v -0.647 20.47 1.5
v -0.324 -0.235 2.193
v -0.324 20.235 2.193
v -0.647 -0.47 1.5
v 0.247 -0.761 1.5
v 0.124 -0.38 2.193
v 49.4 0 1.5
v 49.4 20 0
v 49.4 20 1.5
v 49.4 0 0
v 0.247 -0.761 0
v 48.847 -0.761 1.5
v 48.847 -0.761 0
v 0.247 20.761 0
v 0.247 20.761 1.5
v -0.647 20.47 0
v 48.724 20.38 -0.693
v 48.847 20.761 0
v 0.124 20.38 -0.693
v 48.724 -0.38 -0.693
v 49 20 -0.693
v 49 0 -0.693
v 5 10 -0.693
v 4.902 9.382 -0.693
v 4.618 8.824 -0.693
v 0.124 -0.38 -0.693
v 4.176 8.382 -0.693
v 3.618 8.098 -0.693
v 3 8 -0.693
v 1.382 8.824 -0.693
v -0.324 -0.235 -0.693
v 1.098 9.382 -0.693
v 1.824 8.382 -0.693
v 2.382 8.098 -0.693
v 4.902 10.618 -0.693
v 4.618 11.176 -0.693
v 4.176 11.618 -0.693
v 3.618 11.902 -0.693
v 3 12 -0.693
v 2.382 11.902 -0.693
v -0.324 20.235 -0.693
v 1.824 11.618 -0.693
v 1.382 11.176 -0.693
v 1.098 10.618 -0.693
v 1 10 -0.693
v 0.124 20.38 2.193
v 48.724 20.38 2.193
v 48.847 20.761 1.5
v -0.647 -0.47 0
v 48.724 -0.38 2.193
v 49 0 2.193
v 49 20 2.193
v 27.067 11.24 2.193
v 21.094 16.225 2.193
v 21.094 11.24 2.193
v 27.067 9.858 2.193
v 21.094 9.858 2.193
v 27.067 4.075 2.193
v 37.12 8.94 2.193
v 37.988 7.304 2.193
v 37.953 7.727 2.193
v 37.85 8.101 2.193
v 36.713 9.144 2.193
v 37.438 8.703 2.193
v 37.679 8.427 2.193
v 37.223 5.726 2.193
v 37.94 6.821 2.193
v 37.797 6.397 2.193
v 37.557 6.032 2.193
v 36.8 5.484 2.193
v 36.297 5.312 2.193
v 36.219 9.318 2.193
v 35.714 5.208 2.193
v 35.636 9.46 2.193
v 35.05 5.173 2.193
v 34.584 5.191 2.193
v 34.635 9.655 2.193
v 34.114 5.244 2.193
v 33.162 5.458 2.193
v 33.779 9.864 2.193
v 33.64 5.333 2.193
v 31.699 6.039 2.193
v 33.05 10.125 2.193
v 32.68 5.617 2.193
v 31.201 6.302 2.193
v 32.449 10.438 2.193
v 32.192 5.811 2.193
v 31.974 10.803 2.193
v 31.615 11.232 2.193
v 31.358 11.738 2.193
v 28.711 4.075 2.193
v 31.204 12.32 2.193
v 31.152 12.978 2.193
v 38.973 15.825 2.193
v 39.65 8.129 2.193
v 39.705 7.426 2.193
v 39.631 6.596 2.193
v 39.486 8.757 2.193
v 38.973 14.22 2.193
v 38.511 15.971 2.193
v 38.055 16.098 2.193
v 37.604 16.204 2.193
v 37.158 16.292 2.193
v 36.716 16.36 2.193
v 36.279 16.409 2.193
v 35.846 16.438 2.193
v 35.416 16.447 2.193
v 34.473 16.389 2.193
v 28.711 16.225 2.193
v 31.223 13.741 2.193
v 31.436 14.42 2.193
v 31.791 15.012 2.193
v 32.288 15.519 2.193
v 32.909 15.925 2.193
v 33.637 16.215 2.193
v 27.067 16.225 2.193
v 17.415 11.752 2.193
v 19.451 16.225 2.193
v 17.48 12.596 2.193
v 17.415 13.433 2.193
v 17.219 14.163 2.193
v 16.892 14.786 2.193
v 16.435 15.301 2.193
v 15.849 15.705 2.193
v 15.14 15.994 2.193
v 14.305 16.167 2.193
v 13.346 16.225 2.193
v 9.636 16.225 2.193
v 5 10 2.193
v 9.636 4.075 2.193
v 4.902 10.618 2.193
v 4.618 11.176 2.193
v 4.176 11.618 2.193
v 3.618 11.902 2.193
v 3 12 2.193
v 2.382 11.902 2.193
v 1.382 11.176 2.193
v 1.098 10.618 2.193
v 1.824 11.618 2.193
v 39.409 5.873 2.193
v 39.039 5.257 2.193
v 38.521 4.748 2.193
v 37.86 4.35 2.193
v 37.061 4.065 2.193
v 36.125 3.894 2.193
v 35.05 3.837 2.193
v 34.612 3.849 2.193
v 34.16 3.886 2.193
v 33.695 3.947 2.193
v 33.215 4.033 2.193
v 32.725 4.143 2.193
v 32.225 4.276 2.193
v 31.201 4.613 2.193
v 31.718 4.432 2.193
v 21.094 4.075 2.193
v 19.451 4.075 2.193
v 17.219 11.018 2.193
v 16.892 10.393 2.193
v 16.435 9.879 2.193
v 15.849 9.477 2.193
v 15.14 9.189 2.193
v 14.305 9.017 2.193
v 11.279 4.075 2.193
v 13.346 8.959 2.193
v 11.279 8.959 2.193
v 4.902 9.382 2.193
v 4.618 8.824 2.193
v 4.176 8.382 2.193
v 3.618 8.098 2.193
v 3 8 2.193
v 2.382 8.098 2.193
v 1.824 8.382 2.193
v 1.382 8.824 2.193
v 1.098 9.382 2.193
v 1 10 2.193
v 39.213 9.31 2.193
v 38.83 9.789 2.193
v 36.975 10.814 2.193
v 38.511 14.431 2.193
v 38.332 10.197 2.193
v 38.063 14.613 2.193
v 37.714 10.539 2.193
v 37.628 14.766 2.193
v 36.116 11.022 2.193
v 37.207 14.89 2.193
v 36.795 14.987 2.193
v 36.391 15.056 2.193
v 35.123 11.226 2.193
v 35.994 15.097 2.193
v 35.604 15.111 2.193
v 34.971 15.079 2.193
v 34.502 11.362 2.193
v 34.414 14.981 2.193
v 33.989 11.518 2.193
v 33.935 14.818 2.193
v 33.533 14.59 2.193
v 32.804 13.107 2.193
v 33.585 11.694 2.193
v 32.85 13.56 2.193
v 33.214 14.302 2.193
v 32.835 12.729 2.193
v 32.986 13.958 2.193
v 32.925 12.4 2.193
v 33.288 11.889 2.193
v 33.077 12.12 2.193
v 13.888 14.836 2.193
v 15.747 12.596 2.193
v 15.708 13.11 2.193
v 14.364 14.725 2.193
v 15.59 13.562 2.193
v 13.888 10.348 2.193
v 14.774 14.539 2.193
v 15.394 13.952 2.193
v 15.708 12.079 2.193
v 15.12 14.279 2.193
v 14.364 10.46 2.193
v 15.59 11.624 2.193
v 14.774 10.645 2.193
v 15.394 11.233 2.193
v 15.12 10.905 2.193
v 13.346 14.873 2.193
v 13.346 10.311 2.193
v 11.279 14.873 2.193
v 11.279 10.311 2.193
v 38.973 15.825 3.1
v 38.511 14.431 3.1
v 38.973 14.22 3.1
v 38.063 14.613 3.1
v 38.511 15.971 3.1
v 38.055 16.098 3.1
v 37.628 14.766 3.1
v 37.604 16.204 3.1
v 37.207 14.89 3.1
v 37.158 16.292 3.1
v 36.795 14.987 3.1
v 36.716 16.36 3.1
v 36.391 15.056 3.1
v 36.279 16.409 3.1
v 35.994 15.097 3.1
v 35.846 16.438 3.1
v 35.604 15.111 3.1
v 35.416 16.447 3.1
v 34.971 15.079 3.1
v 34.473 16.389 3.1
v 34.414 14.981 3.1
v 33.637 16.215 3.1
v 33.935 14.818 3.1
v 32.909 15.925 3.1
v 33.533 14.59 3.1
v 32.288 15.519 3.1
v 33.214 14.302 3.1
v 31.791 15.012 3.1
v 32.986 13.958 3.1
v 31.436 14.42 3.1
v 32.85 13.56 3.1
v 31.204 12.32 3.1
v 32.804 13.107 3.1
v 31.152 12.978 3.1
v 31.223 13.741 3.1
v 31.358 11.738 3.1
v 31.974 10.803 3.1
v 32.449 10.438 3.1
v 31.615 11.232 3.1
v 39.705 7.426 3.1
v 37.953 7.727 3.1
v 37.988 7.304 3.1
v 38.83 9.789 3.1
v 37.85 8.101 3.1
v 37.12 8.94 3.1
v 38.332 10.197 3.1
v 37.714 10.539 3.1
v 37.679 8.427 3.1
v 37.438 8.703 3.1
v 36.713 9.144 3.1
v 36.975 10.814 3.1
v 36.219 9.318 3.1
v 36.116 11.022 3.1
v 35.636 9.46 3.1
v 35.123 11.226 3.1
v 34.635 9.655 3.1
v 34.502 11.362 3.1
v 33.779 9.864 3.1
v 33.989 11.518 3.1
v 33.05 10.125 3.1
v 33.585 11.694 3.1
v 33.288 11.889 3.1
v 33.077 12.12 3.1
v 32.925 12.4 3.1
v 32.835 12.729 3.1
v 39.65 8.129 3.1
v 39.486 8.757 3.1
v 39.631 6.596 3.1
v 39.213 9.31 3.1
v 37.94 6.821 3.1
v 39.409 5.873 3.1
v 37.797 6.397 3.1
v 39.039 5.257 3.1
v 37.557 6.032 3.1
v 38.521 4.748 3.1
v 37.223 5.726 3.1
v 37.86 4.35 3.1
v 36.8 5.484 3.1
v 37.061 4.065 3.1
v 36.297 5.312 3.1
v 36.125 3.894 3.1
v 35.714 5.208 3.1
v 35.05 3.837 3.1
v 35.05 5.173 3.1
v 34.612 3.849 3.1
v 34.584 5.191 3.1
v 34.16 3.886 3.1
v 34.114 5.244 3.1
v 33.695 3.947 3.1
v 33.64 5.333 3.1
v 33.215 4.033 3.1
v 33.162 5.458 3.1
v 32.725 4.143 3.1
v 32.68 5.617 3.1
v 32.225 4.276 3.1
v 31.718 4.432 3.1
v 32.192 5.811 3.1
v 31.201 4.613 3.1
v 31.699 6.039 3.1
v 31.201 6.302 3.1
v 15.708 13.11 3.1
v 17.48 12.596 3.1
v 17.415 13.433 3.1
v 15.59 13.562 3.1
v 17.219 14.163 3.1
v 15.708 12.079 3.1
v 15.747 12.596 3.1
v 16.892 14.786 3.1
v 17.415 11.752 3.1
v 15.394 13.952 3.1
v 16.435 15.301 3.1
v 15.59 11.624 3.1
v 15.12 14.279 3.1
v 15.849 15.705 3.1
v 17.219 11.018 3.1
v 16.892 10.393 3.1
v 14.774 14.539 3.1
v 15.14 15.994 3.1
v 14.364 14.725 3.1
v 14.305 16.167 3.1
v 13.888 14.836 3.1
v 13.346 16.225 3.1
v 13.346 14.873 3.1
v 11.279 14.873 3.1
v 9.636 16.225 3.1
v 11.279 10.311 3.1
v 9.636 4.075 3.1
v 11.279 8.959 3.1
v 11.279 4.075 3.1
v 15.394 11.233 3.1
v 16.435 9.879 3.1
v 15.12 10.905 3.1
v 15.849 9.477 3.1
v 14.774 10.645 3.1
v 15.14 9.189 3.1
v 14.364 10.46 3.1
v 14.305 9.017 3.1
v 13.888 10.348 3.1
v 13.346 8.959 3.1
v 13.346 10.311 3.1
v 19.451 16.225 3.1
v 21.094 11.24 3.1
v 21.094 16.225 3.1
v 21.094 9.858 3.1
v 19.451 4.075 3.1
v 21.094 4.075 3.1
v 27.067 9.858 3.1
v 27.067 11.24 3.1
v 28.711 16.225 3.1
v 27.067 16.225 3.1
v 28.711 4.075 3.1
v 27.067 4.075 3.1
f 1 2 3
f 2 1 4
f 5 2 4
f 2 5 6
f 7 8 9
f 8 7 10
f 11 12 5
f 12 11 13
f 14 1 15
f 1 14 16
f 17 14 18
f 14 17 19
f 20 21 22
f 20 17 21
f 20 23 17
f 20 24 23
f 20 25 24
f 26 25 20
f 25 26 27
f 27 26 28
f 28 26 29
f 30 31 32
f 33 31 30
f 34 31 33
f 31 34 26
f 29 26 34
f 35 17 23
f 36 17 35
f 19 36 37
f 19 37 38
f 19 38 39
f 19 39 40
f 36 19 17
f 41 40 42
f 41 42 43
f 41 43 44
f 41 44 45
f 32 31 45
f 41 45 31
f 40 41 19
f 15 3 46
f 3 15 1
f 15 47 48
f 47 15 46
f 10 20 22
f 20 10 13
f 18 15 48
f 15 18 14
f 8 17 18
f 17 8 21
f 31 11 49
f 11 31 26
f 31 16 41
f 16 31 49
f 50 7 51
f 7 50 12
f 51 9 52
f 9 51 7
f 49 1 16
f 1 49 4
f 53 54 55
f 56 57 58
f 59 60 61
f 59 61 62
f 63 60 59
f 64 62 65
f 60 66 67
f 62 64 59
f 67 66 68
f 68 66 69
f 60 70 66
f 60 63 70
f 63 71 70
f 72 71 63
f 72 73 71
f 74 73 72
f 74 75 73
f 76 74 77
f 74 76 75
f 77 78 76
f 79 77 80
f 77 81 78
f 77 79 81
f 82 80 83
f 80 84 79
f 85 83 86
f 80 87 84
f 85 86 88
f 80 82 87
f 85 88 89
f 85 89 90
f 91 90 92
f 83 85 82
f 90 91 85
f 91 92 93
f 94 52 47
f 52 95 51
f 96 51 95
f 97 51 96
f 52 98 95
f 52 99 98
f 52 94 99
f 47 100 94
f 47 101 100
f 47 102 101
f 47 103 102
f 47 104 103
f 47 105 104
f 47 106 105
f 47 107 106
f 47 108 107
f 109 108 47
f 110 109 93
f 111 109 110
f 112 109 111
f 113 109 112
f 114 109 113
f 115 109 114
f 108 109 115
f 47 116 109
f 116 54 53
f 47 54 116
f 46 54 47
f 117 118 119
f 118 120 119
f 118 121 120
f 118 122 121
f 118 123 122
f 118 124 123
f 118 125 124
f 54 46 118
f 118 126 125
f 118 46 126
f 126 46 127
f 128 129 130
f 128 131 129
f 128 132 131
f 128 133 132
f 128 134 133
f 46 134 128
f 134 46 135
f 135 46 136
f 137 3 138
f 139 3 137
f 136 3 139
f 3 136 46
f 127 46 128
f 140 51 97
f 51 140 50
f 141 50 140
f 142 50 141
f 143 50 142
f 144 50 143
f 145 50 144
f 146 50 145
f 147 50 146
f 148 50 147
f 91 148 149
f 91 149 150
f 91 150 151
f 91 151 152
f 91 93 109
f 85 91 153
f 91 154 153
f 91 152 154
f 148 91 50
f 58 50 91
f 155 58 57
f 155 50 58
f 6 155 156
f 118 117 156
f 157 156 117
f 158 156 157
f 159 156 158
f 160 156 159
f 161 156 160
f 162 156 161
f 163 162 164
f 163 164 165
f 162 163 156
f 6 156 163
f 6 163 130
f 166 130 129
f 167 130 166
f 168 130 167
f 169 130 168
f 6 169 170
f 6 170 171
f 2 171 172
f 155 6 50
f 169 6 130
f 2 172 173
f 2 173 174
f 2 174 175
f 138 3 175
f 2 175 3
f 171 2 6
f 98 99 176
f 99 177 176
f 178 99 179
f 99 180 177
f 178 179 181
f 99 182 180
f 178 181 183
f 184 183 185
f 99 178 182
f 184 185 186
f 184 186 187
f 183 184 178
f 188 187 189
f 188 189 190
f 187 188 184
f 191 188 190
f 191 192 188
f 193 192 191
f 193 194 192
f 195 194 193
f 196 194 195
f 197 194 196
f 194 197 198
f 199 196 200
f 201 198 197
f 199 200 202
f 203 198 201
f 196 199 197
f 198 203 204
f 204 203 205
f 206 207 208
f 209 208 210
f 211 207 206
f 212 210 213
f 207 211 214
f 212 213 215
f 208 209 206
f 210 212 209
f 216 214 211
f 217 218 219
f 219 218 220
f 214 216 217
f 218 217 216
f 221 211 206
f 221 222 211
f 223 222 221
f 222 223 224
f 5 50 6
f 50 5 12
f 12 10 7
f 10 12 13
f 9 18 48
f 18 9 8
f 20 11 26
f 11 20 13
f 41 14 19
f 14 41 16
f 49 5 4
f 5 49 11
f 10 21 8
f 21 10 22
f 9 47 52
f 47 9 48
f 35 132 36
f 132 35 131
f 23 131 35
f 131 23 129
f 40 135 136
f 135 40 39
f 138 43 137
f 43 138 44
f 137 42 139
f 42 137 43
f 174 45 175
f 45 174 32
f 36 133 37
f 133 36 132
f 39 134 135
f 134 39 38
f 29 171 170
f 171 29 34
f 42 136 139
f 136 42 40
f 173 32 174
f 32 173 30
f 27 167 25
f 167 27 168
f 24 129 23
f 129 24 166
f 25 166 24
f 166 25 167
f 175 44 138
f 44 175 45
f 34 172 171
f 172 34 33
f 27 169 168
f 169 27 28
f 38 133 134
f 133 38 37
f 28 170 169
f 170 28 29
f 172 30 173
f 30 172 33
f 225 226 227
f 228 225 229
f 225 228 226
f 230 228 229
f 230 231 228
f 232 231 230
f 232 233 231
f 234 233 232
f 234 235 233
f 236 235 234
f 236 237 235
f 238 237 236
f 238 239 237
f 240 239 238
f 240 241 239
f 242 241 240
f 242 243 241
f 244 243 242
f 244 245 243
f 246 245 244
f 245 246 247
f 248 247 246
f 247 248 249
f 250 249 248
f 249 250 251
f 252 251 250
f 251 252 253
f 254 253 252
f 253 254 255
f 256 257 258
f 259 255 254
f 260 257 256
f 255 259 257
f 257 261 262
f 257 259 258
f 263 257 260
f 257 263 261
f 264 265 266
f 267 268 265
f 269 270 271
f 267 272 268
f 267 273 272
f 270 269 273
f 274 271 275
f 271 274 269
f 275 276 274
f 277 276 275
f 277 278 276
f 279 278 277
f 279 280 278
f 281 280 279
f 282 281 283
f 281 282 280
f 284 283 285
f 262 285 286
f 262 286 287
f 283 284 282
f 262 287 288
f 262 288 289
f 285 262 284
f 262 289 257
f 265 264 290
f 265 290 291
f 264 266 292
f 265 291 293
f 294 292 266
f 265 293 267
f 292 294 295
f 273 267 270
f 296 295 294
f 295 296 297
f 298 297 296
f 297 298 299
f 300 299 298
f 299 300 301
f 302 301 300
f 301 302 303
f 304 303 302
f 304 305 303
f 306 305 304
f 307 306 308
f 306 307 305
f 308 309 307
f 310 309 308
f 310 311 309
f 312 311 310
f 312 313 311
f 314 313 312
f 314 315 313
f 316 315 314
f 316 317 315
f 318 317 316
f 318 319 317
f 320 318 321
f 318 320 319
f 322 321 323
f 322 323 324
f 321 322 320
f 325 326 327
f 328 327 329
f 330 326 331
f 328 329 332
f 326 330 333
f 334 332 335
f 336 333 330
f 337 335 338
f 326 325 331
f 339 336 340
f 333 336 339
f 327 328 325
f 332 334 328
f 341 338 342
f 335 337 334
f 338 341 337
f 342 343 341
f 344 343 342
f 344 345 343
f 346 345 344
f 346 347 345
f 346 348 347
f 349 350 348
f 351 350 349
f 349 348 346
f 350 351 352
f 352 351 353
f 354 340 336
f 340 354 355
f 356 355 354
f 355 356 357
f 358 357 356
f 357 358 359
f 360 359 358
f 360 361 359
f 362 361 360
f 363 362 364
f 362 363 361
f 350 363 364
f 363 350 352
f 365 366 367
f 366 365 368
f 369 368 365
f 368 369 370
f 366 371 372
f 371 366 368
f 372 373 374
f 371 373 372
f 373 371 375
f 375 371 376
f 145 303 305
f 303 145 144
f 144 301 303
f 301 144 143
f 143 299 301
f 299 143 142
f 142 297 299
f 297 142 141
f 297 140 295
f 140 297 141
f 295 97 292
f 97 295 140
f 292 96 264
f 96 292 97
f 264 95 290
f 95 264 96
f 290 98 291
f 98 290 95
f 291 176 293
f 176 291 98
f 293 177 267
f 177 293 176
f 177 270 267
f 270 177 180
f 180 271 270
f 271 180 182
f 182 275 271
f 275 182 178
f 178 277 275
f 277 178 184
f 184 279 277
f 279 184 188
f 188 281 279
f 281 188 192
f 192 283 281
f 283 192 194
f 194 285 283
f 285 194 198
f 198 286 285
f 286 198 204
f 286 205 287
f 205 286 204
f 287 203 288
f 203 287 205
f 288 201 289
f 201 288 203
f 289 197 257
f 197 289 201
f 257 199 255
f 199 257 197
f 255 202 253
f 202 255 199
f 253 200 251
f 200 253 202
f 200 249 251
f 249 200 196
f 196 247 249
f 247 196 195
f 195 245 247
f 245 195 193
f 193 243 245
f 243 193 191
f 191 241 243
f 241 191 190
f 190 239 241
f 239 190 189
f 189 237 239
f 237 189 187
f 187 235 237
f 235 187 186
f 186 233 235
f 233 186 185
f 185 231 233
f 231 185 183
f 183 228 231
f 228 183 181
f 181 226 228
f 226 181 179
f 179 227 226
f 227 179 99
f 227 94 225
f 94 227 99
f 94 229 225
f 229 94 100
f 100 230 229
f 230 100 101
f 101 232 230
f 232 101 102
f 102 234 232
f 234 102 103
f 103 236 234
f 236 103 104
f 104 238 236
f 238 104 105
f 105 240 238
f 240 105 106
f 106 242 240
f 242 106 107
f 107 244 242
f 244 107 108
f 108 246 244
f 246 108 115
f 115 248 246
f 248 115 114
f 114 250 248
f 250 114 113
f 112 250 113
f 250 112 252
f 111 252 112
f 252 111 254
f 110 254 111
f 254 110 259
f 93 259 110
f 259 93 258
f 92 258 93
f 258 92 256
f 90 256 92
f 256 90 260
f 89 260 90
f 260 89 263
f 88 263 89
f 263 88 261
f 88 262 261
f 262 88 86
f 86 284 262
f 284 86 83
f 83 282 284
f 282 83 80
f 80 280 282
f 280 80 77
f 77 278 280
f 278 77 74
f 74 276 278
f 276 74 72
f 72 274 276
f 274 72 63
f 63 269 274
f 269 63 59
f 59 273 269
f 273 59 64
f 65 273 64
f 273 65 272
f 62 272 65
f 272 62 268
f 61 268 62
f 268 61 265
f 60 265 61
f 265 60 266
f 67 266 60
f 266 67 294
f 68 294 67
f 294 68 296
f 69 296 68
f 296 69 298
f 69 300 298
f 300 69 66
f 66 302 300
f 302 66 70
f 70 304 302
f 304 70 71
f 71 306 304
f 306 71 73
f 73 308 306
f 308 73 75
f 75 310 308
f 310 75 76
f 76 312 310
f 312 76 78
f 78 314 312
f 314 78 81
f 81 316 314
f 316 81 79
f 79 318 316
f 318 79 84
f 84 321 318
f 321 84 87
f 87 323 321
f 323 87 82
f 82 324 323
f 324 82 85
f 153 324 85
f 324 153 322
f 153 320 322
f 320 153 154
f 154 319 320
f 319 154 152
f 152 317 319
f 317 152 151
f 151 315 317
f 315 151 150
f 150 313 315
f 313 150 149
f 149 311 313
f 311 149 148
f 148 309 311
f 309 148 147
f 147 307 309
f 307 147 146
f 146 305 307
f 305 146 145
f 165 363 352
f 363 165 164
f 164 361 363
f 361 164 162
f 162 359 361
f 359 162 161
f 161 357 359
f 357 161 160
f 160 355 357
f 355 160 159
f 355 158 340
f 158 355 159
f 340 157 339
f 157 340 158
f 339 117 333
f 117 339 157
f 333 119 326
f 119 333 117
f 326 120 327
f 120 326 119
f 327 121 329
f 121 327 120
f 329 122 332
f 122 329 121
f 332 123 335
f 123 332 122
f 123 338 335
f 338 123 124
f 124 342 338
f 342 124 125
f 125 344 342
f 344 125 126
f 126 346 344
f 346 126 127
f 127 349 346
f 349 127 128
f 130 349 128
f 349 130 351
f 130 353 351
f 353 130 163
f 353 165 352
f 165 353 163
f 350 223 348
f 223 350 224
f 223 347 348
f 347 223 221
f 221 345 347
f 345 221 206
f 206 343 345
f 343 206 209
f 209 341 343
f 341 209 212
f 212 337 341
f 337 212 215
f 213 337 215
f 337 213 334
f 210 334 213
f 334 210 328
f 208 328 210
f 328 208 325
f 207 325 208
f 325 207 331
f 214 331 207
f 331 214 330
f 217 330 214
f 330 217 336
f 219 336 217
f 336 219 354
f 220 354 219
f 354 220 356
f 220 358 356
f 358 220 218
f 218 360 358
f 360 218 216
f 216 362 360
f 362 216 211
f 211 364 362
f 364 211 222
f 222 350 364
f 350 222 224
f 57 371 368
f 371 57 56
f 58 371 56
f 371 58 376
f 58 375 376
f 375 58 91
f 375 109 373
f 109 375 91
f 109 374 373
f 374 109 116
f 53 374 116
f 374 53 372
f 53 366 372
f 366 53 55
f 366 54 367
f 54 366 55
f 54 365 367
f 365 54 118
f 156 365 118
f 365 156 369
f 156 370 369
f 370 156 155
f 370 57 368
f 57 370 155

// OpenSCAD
/*
The MIT License (MIT)

Copyright (c) 2016 Lynn A. Roth

Permission is hereby granted, free of charge, to any person obtaining a copy of
this software and associated documentation files (the "Software"), to deal in
the Software without restriction, including without limitation the rights to
use, copy, modify, merge, publish, distribute, sublicense, and/or sell copies of
the Software, and to permit persons to whom the Software is furnished to do so,
subject to the following conditions:

The above copyright notice and this permission notice shall be included in all
copies or substantial portions of the Software.

THE SOFTWARE IS PROVIDED "AS IS", WITHOUT WARRANTY OF ANY KIND, EXPRESS OR
IMPLIED, INCLUDING BUT NOT LIMITED TO THE WARRANTIES OF MERCHANTABILITY, FITNESS
FOR A PARTICULAR PURPOSE AND NONINFRINGEMENT. IN NO EVENT SHALL THE AUTHORS OR
COPYRIGHT HOLDERS BE LIABLE FOR ANY CLAIM, DAMAGES OR OTHER LIABILITY, WHETHER
IN AN ACTION OF CONTRACT, TORT OR OTHERWISE, ARISING FROM, OUT OF OR IN
CONNECTION WITH THE SOFTWARE OR THE USE OR OTHER DEALINGS IN THE SOFTWARE.
*/

//Set the words array to the words you want engraved.  One per side.
word="PHS";

//Set wordCount to the number of times the word should be printed.
letterCount=len(word);

//Depth of the word
namedepth = 1;

lw = 12.2;
margin = 6;
width= letterCount * lw + margin + margin;

//Height of main body of keyring
height=20;

//Thickness of keychain
depth = 1.5;

union()
{
    difference()
    {
       body();
          

        translate([3,height/2,-.8])
            cylinder(r=2, h=depth + 2, $fn=20);
        
    }
    #translate([margin+2,height/2,depth])
        linear_extrude(height=namedepth+.6)
            text(text=word, size=12, font="Arial Black", halign="left", valign="center");
    }

module body()
{
     minkowski()
		{
			cube([width, height, depth]);
			sphere(.8);
		};
}
                        
